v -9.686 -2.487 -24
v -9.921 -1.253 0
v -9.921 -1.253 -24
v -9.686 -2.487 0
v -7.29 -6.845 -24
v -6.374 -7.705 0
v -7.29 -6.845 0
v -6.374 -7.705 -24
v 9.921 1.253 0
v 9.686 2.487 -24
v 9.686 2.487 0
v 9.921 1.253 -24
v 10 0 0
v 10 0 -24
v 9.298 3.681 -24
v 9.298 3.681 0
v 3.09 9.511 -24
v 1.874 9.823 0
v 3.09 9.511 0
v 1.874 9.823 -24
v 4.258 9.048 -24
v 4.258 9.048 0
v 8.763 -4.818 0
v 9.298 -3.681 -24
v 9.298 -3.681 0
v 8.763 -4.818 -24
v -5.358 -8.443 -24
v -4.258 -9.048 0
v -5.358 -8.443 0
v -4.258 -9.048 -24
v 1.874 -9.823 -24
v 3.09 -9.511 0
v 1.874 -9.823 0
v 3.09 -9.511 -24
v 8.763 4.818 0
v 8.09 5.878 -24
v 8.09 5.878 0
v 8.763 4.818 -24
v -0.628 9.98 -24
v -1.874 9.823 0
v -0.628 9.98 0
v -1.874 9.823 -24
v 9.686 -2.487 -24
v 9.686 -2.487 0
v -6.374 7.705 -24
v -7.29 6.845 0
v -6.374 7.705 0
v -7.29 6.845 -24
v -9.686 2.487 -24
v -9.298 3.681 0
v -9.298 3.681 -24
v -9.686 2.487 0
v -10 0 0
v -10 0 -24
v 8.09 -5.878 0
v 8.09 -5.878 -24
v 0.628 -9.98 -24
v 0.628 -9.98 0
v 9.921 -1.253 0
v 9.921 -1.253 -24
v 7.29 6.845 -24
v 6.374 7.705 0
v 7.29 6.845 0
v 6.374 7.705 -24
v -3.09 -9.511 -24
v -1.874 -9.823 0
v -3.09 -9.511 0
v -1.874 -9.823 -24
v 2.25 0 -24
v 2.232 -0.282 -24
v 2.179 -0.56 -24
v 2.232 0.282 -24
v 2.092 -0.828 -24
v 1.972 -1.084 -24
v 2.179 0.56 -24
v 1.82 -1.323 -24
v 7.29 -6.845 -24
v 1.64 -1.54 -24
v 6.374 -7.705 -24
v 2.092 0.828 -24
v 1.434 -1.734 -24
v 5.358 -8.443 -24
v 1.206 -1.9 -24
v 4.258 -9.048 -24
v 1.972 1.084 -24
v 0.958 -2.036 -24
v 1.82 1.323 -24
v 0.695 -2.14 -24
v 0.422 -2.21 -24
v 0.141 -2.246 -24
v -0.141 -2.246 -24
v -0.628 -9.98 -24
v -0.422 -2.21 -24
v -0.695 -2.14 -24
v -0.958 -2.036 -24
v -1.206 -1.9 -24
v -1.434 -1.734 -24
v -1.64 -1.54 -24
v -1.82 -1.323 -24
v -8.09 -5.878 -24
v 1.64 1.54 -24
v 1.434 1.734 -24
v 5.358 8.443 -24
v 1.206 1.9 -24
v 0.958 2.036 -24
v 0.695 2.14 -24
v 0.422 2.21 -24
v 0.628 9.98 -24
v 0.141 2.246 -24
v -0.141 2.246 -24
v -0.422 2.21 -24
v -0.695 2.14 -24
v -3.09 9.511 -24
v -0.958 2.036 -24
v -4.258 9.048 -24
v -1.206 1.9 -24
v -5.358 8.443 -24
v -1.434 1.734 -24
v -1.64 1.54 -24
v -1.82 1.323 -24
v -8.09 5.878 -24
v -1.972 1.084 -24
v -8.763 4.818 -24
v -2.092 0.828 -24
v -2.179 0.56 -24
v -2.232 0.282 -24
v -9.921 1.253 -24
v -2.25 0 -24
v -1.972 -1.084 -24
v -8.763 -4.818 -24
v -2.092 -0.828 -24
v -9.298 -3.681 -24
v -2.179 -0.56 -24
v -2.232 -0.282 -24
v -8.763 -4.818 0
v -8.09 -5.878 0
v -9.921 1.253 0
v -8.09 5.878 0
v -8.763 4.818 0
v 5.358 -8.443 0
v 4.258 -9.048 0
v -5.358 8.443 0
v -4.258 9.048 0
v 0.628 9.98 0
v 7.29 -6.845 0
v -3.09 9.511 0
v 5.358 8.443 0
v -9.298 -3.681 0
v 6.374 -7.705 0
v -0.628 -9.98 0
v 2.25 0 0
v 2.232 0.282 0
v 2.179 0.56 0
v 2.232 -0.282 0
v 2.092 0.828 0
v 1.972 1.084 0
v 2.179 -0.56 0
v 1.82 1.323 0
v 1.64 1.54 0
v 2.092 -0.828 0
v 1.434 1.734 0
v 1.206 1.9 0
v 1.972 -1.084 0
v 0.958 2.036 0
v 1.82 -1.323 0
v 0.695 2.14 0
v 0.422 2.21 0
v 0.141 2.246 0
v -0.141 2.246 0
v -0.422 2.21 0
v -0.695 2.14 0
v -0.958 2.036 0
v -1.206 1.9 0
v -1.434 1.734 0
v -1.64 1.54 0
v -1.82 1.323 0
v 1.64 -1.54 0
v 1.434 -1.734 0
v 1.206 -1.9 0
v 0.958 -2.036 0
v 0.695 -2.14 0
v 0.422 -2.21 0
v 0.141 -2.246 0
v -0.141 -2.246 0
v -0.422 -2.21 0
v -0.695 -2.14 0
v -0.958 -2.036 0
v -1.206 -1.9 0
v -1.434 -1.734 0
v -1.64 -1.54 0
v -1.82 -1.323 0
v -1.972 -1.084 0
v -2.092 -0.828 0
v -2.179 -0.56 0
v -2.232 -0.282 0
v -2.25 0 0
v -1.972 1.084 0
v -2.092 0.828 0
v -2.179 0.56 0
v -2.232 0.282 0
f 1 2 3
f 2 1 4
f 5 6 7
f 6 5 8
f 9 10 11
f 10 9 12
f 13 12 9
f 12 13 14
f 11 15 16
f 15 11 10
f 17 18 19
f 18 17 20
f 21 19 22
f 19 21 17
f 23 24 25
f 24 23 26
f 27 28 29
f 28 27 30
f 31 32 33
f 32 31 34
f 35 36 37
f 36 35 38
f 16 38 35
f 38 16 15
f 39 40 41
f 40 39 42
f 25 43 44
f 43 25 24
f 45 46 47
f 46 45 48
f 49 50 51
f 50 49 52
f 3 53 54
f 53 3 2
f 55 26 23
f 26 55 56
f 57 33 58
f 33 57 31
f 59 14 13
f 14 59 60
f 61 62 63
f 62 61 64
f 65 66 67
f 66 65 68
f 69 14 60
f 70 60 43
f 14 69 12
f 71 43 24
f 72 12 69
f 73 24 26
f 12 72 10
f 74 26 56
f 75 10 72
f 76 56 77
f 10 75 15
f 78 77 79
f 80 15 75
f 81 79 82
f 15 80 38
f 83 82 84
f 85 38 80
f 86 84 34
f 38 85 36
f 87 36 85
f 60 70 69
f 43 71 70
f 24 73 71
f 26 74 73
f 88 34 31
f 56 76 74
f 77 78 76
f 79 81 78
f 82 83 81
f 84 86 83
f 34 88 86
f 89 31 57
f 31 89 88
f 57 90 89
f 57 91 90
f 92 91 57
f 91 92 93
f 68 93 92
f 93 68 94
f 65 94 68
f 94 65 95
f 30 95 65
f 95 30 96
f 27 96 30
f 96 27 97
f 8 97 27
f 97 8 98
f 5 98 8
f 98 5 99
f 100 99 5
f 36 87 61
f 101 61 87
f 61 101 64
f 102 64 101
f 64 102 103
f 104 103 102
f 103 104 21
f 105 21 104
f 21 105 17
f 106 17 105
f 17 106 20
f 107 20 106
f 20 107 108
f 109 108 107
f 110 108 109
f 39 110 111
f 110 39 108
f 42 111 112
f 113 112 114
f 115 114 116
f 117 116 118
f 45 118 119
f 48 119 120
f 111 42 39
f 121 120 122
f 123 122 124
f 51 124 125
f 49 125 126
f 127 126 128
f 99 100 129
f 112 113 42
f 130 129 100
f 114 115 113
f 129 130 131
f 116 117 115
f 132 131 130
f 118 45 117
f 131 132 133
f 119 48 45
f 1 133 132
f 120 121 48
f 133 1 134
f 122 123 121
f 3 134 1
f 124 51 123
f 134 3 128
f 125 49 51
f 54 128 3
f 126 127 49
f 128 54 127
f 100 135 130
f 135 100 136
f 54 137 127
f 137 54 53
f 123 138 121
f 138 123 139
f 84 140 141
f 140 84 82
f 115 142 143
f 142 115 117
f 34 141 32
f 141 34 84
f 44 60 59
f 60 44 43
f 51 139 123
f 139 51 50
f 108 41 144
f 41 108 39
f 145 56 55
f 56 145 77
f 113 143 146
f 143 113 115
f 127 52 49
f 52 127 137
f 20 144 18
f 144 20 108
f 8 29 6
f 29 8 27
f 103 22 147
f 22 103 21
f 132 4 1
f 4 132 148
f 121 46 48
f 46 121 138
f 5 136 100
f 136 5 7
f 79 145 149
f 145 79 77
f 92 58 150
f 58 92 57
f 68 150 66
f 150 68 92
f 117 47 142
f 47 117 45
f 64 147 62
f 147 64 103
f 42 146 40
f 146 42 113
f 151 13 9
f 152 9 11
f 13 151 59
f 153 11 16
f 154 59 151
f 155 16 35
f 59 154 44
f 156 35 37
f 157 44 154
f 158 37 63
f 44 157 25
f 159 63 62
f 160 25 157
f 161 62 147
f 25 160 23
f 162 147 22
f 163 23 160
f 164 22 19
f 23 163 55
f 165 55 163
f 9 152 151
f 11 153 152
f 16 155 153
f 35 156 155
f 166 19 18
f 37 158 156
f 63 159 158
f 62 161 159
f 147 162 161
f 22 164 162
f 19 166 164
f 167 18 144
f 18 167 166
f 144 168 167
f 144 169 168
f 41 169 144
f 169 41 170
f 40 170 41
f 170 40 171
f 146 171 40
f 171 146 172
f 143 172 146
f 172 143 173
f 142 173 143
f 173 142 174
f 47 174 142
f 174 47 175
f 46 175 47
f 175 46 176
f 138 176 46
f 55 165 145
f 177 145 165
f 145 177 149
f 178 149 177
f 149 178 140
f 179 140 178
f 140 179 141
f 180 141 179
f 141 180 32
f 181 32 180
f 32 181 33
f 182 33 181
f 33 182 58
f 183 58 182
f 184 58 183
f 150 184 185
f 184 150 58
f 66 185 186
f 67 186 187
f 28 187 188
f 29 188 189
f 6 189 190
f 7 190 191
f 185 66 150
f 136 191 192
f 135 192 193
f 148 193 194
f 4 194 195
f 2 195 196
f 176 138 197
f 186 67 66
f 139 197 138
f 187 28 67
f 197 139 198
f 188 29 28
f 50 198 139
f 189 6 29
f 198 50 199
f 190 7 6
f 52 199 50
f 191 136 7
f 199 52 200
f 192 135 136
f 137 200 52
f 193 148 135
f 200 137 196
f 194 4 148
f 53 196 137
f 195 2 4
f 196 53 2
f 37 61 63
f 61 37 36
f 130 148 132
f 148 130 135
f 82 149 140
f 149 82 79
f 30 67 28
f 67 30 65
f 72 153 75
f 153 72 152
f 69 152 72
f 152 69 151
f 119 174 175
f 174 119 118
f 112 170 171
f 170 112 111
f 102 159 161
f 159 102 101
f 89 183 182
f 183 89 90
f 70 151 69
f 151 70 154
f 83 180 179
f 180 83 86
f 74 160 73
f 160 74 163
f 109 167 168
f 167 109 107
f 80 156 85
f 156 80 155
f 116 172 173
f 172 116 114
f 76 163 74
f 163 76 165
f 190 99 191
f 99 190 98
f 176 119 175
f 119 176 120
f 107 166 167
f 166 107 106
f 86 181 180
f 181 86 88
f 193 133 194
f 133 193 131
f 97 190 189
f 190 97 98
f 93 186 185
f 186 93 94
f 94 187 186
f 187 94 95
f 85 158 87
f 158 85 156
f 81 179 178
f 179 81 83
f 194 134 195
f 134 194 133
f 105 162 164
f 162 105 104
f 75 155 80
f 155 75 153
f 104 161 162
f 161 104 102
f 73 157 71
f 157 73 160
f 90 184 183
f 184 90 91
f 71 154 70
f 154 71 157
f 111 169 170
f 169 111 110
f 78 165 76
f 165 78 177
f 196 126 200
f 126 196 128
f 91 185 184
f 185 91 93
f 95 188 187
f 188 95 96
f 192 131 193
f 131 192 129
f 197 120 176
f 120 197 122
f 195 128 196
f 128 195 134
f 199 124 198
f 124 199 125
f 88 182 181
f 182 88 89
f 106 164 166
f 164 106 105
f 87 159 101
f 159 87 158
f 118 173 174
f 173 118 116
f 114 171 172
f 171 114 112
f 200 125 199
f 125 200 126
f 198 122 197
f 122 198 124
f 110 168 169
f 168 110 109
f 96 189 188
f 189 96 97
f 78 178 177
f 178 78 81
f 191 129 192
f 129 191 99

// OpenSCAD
$fn = 50;


difference() {
	union() {
		translate(v = [0, 0, -24.0000000000]) {
			cylinder(h = 24, r = 10.0000000000);
		}
		cylinder(h = 0, r = 13.0000000000);
	}
	union() {
		#translate(v = [0, 0, -24]) {
			cylinder(h = 24, r = 2.2500000000);
		}
	}
}
